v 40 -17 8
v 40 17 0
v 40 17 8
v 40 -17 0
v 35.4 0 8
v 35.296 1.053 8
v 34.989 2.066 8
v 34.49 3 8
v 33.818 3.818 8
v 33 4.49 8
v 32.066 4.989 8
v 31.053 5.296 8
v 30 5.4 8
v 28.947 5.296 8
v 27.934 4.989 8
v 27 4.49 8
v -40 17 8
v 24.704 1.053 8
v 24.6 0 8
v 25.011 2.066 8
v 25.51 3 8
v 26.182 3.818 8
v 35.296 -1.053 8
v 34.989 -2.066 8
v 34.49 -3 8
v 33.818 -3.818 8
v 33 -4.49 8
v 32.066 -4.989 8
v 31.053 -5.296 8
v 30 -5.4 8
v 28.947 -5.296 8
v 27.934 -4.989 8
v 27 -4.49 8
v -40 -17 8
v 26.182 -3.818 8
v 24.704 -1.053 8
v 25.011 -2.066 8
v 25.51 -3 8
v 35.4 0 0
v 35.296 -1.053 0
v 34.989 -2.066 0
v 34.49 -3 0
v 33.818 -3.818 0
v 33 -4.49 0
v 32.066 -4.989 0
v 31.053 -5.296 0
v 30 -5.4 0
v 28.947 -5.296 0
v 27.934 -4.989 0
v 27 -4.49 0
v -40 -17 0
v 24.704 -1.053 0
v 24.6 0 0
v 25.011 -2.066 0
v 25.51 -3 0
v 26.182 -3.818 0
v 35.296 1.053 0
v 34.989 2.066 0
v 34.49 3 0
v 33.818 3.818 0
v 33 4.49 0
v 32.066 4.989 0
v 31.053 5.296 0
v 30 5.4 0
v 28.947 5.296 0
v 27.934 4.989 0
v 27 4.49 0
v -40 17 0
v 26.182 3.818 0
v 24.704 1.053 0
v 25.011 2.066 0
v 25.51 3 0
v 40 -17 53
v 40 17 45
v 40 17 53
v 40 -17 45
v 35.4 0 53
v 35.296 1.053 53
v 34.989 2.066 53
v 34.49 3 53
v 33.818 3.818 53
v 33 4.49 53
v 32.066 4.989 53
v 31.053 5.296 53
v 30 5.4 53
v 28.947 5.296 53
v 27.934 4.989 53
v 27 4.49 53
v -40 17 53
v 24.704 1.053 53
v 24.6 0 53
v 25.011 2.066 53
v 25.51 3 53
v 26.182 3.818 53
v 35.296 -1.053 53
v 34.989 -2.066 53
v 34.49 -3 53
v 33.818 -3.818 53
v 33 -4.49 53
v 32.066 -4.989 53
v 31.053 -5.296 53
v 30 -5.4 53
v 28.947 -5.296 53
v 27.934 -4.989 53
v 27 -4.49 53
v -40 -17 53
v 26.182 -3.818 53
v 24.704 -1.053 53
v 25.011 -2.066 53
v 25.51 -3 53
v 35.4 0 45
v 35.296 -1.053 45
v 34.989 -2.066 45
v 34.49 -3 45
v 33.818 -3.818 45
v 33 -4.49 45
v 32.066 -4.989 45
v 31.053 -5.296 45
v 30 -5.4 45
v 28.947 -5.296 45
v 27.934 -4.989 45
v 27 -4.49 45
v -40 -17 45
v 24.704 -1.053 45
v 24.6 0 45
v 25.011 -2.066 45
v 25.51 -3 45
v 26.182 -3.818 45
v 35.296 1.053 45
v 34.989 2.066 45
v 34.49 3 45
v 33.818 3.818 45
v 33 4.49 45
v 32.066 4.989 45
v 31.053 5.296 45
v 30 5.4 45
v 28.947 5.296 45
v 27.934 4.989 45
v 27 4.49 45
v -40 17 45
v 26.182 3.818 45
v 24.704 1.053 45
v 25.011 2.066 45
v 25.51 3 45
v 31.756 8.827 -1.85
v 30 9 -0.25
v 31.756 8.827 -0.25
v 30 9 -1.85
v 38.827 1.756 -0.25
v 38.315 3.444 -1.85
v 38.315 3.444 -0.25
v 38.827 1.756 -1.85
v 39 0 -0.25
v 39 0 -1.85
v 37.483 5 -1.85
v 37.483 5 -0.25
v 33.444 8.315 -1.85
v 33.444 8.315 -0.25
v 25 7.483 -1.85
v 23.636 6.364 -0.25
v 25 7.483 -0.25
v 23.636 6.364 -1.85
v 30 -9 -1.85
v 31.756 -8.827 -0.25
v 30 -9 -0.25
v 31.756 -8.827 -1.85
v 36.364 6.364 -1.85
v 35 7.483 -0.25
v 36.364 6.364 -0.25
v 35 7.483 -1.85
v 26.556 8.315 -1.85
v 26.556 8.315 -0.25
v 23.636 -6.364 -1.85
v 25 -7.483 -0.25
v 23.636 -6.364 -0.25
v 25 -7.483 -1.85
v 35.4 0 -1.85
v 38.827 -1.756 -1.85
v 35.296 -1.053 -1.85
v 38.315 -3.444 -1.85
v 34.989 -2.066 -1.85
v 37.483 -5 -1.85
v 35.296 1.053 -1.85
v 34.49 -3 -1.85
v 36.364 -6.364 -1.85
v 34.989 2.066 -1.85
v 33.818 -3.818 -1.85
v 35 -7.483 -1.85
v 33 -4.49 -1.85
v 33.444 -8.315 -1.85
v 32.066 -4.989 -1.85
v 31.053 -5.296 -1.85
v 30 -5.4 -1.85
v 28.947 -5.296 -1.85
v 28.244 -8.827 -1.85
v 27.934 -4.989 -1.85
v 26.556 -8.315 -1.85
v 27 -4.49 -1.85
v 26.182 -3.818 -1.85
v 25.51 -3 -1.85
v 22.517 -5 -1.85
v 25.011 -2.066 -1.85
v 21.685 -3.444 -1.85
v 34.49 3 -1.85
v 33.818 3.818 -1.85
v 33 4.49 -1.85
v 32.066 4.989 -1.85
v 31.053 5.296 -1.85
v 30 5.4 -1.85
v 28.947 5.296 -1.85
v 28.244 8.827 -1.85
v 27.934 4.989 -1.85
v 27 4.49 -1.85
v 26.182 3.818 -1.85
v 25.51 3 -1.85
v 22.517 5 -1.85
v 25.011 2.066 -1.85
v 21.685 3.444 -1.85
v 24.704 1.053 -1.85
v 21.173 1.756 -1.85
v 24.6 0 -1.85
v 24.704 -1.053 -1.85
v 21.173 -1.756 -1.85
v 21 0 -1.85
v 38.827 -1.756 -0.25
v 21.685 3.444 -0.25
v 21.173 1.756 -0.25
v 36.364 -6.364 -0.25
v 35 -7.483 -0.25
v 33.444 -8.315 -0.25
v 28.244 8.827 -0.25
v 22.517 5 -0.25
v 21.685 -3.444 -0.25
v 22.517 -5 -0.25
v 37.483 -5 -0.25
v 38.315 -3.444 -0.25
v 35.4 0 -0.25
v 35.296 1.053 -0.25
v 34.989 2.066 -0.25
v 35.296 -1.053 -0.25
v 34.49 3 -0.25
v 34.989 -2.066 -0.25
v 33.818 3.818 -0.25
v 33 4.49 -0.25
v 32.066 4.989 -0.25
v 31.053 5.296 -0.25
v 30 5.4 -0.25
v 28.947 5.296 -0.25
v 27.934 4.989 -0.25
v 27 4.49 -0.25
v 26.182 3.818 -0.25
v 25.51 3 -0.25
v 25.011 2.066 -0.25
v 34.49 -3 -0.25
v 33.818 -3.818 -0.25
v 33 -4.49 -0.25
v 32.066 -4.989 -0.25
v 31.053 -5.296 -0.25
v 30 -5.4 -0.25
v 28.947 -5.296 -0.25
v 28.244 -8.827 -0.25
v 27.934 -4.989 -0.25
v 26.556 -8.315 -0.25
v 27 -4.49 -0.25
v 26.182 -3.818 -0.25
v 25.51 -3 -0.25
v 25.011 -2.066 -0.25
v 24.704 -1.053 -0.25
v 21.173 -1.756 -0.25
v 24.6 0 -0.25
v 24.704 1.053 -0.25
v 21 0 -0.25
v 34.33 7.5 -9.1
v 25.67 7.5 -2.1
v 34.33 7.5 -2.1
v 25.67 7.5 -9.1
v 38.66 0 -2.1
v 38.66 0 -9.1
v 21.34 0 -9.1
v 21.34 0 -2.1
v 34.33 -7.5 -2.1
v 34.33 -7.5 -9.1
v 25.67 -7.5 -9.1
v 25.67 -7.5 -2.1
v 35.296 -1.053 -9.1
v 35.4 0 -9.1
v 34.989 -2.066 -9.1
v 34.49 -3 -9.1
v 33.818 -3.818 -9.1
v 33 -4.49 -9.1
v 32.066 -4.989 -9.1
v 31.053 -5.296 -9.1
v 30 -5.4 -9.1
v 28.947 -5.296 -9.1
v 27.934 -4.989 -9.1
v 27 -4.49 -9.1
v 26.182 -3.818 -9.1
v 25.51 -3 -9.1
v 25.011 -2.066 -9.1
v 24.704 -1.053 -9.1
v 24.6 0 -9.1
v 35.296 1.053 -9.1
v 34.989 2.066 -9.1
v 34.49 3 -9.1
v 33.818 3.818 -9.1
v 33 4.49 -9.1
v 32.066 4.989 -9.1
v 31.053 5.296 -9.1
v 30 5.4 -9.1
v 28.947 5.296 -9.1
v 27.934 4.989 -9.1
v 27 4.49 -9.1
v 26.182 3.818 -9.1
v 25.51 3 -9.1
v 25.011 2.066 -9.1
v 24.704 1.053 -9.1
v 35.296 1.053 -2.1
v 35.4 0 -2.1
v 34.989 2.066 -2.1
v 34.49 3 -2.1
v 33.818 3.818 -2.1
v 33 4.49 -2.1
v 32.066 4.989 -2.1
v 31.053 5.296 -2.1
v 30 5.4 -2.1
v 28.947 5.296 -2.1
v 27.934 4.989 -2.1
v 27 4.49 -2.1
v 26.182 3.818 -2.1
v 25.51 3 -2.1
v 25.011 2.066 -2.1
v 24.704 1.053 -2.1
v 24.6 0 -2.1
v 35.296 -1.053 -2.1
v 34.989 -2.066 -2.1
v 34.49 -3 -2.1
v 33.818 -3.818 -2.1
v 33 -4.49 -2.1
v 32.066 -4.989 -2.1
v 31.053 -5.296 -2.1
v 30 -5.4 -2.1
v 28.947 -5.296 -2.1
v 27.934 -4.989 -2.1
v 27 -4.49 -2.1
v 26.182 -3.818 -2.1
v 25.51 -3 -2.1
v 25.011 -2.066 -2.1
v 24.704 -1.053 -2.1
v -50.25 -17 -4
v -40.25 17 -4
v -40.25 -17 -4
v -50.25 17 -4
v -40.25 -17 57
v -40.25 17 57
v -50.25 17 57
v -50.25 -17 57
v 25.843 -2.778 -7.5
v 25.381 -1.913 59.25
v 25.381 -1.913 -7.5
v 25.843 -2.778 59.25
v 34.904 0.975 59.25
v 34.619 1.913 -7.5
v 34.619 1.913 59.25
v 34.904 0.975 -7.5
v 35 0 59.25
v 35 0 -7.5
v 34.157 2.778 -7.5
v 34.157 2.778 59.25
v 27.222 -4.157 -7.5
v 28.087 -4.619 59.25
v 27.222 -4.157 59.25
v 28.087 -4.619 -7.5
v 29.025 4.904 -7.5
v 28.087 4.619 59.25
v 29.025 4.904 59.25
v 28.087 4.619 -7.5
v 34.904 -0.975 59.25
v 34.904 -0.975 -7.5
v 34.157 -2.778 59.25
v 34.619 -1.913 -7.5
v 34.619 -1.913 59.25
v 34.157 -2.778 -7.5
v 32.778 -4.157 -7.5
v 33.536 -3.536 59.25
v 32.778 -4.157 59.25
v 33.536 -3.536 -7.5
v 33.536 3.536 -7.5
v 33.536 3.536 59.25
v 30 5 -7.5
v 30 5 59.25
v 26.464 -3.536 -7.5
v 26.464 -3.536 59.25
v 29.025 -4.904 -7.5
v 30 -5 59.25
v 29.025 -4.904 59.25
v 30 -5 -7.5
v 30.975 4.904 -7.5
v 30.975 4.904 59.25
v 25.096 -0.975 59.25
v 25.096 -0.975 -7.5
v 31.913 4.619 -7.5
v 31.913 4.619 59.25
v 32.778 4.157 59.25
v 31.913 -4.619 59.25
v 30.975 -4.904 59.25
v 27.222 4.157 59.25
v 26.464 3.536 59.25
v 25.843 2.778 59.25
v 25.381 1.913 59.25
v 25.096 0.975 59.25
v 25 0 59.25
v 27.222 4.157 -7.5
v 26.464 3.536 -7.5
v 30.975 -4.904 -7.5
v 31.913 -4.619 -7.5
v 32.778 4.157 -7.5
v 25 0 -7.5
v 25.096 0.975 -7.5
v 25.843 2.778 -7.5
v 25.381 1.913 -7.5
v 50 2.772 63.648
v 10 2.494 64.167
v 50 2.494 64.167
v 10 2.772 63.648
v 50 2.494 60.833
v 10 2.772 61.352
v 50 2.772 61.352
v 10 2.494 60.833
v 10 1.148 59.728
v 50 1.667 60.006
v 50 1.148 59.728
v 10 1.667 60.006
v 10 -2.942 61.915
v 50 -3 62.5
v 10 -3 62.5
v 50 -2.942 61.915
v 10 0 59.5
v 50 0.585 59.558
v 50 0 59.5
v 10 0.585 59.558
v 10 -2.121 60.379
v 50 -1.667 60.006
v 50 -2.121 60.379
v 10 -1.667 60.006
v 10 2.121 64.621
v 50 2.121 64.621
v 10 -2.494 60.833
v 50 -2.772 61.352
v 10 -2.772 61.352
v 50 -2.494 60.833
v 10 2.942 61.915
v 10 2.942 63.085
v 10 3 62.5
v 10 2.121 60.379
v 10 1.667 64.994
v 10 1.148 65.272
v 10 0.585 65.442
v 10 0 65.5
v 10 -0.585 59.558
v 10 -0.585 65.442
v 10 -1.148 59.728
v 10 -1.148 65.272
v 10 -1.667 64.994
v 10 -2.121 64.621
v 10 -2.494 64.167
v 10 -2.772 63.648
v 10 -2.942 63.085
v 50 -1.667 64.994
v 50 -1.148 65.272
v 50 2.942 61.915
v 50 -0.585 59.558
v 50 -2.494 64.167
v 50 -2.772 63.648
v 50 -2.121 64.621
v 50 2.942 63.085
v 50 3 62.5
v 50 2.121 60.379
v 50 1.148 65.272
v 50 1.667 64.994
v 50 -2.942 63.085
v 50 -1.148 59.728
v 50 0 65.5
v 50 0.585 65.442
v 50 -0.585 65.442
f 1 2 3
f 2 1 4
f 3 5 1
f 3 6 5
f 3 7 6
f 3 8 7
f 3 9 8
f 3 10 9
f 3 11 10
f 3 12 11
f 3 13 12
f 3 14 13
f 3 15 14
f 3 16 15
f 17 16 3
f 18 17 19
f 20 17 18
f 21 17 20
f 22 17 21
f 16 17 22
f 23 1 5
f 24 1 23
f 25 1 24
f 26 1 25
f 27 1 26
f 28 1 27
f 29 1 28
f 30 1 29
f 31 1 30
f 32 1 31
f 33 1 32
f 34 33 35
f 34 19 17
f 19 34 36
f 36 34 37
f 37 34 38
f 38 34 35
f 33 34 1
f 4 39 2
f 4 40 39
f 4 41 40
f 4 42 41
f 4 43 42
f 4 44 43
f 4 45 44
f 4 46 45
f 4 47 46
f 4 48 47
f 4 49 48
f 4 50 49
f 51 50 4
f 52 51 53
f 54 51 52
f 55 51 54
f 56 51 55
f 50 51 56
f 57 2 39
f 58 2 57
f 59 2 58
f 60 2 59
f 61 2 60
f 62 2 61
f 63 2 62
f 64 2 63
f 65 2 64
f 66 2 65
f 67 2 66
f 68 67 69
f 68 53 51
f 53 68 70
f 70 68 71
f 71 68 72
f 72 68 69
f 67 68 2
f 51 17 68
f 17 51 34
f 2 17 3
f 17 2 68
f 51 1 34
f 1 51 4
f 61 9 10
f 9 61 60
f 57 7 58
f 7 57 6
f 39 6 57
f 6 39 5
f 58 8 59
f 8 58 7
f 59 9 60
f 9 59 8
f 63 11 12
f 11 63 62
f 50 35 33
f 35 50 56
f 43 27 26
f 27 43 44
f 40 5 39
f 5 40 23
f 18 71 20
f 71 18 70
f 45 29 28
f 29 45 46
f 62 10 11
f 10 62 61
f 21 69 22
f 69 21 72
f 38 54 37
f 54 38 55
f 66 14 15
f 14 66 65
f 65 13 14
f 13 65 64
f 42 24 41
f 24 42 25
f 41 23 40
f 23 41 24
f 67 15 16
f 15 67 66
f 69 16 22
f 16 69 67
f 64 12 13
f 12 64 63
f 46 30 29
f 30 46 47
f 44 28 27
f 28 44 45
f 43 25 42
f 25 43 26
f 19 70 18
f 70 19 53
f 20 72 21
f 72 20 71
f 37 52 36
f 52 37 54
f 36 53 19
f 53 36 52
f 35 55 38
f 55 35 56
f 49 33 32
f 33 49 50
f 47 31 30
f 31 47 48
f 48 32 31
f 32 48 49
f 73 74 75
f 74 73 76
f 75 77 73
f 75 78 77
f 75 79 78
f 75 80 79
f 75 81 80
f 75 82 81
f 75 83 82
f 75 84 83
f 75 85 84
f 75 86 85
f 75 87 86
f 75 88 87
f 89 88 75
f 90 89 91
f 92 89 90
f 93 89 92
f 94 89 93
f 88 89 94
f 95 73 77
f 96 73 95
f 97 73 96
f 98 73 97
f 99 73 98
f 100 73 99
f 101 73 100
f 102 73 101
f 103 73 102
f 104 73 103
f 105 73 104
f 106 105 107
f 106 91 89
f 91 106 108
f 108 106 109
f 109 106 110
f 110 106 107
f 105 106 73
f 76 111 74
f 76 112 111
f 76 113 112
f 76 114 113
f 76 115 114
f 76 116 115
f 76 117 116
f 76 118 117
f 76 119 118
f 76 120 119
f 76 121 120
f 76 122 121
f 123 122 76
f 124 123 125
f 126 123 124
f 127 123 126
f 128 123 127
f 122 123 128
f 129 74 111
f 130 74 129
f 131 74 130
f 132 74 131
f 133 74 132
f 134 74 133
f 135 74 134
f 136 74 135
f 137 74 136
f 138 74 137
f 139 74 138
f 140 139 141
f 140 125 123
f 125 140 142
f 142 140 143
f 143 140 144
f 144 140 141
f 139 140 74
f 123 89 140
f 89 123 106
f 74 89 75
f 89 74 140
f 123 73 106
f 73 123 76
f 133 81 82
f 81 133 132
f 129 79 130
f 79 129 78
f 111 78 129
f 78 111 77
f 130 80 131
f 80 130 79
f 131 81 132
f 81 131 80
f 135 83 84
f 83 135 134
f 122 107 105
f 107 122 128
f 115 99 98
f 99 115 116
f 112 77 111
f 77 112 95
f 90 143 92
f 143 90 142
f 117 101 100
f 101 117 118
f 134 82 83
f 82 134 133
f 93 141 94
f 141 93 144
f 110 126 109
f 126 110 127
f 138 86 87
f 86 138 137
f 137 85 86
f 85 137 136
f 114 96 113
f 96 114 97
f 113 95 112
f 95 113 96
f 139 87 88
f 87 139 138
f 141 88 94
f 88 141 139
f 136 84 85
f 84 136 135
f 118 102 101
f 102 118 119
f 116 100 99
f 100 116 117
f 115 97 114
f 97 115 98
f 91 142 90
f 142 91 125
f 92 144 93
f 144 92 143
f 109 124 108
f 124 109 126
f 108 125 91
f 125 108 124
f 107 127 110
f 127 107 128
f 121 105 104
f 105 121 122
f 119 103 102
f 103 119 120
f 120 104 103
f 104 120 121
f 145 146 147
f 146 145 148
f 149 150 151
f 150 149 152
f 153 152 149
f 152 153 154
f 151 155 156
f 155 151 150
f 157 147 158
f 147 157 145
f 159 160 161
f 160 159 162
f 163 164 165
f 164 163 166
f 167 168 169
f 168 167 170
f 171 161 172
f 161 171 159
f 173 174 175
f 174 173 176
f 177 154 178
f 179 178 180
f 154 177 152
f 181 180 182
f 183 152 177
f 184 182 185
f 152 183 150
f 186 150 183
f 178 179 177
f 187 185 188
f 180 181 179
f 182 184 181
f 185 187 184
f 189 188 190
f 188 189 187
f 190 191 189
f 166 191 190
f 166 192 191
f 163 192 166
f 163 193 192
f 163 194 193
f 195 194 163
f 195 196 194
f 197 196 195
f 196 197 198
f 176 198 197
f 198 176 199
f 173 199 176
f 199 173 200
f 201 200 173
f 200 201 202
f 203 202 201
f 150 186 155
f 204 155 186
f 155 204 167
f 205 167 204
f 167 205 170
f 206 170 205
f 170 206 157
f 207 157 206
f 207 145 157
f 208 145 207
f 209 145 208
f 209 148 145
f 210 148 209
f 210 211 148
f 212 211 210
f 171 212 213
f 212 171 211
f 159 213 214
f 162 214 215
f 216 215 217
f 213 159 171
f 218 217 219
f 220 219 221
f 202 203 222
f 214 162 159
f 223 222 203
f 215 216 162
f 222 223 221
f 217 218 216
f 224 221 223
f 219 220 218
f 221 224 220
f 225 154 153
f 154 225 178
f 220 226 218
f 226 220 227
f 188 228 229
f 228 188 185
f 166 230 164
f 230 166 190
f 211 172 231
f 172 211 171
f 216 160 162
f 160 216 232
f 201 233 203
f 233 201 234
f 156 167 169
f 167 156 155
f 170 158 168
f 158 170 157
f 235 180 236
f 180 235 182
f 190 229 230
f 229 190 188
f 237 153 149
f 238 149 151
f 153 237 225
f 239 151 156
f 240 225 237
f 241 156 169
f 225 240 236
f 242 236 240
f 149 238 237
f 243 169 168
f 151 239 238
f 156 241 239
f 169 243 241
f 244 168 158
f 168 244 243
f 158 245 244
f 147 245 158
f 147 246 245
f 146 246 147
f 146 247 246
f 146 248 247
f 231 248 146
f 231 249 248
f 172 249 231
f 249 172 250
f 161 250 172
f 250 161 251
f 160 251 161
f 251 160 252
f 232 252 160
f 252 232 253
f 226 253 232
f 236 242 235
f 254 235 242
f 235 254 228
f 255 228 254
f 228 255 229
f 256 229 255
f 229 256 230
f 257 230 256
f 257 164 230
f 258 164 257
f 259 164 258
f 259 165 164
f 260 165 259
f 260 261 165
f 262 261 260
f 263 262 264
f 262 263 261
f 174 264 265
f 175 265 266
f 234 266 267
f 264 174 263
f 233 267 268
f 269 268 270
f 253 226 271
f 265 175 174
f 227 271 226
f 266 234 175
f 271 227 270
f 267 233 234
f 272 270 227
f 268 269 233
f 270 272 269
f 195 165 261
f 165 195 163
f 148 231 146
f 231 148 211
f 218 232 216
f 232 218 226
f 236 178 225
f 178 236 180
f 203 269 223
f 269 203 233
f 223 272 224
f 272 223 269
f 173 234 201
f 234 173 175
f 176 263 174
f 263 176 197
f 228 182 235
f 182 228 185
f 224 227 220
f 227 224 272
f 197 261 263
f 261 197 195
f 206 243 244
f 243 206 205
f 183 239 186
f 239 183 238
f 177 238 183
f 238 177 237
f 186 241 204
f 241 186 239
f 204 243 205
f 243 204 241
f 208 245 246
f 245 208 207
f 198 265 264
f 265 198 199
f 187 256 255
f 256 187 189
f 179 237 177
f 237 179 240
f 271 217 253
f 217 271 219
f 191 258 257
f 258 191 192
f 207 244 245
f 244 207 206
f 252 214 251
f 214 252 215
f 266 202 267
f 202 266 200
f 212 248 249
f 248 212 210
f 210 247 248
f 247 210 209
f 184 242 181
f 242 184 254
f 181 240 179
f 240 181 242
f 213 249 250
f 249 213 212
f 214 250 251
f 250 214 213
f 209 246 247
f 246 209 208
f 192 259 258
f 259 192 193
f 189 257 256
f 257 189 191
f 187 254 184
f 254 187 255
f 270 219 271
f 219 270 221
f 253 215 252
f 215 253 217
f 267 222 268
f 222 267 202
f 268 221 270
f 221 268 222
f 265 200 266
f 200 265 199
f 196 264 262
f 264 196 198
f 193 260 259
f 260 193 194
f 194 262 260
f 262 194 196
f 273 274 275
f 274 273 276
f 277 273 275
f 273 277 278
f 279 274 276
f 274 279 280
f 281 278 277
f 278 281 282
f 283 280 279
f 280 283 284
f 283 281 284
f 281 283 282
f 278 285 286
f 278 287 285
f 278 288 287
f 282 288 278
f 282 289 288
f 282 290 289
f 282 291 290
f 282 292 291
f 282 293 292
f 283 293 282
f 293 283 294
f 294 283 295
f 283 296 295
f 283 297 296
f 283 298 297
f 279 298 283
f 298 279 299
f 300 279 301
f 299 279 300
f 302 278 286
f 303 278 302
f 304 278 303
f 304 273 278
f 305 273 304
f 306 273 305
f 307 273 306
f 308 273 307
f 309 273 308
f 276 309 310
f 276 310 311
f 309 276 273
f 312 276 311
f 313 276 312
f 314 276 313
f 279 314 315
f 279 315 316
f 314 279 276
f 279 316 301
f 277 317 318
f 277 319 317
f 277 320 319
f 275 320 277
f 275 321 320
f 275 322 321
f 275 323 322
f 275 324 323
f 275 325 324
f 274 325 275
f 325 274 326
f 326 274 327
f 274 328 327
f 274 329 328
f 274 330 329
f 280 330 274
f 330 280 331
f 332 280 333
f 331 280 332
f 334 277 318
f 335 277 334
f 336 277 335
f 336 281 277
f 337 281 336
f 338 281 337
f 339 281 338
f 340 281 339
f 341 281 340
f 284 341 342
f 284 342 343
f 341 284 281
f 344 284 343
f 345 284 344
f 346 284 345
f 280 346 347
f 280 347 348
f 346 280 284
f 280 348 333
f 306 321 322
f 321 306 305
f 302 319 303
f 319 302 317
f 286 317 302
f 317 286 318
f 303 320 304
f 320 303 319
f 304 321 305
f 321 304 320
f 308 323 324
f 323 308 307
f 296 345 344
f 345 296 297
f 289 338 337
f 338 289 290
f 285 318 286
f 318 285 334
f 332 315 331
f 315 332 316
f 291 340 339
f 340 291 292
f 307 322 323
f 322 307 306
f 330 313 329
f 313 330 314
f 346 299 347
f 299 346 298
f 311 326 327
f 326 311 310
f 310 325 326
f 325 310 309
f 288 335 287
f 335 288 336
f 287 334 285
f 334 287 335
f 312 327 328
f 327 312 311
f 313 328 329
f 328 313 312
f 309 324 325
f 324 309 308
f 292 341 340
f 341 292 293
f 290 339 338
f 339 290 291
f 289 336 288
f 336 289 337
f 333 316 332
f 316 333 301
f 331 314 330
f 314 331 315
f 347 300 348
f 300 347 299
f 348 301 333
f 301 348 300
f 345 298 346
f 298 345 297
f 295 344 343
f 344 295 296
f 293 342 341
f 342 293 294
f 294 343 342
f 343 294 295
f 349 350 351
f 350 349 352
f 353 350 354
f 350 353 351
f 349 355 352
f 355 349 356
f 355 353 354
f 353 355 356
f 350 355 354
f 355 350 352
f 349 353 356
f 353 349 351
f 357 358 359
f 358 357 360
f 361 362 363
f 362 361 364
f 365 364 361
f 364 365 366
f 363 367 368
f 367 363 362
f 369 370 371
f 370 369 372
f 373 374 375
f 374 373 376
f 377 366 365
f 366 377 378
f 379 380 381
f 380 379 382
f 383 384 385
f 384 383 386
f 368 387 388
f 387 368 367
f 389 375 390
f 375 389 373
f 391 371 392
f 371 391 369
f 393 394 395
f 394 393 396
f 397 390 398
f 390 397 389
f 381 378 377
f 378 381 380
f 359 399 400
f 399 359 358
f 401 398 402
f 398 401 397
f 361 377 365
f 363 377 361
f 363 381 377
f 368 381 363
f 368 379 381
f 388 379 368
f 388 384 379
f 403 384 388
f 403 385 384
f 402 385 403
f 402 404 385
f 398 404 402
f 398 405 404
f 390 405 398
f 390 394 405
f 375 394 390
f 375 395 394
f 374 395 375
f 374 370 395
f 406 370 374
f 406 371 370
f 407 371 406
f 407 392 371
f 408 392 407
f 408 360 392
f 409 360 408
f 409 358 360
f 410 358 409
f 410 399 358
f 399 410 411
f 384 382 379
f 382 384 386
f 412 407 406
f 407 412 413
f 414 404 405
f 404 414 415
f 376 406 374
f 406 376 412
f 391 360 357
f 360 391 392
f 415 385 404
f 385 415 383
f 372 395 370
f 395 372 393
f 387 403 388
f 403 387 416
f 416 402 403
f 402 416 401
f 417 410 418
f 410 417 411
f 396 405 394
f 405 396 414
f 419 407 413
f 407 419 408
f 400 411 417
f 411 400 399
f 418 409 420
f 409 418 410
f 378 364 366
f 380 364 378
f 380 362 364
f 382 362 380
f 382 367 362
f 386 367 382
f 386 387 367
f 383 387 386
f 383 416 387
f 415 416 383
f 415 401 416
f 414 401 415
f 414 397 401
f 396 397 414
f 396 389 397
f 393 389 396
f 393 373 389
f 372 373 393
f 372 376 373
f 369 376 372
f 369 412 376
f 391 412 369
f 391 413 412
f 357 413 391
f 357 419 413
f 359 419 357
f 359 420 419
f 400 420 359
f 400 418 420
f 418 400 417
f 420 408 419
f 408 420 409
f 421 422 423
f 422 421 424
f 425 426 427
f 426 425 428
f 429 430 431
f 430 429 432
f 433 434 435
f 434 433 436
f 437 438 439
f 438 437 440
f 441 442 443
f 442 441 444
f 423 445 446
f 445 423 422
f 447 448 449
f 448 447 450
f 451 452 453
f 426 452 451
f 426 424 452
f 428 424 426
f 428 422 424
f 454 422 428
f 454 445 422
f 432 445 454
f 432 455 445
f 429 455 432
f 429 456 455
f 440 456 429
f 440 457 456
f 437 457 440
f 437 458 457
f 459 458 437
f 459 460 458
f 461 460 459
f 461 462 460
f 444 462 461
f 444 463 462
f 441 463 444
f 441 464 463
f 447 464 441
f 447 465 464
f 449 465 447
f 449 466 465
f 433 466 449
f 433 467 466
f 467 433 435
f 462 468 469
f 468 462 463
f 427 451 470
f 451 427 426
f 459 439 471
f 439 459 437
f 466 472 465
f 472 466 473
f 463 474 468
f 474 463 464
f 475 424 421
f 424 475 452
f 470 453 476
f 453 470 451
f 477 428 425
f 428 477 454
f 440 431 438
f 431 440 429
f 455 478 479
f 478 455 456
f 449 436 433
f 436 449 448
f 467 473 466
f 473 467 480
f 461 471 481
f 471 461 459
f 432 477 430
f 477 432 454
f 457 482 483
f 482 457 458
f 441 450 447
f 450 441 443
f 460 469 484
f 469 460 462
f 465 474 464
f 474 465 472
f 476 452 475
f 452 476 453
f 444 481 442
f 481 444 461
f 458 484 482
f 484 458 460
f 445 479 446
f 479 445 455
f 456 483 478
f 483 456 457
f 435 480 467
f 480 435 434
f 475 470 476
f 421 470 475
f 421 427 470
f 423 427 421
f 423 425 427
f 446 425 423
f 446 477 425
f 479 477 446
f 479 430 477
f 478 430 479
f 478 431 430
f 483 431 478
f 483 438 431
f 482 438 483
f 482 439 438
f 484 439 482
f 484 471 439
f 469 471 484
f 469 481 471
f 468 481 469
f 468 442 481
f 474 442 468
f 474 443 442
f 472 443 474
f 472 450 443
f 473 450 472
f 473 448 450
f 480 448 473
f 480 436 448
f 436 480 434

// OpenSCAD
$fn = 32;

// ------------------------------------------------------------------------
// C clamp: throat 45 mm, screw d10
// Every part is its own module, assembly() places every instance.
// ------------------------------------------------------------------------

// --- part 1 ---
module clamp_arm() {
  difference() {
    translate([-40, -17, 0]) cube([80, 34, 8]);
    translate([30, 0, -1]) cylinder(h = 10, d = 10.8);
  }
}

// --- part 2 ---
module clamp_spine() {
  difference() {
    translate([-30.5, -17, 0]) cube([61, 34, 10]);
  }
}

// --- part 3 ---
module clamp_screw() {
  translate([0, 0, -33.375]) cylinder(h = 66.75, d = 10);
}

// --- part 4 ---
module clamp_washer() {
  difference() {
      translate([0, 0, 0]) cylinder(h = 1.6, d = 18);
      translate([0, 0, -1]) cylinder(h = 3.6, d = 10.8);
    }
}

// --- part 5 ---
module clamp_nut() {
  difference() {
    linear_extrude(height = 7) polygon(points = [[8.66, 0], [4.33, 7.5], [-4.33, 7.5], [-8.66, 0], [-4.33, -7.5], [4.33, -7.5]]);
    translate([0, 0, -1]) cylinder(h = 9, d = 10.8);
  }
}

// --- part 6 ---
module tommy_bar() {
  translate([0, 0, -20]) cylinder(h = 40, d = 6);
}

// --- assembly ---
module assembly() {
  color([0.80, 0.24, 0.20]) translate([0, 0, 0]) rotate([0, 0, 0]) clamp_arm();
  color([0.20, 0.45, 0.75]) translate([0, 0, 45]) rotate([0, 0, 0]) clamp_arm();
  color([0.25, 0.62, 0.32]) translate([-50.25, 0, 26.5]) rotate([0, 90, 0]) clamp_spine();
  color([0.92, 0.70, 0.18]) translate([30, 0, 25.875]) rotate([0, 0, 0]) clamp_screw();
  color([0.58, 0.35, 0.70]) translate([30, 0, -1.85]) rotate([0, 0, 0]) clamp_washer();
  color([0.16, 0.66, 0.66]) translate([30, 0, -9.1]) rotate([0, 0, 0]) clamp_nut();
  color([0.85, 0.48, 0.18]) translate([30, 0, 62.5]) rotate([0, 90, 0]) tommy_bar();
}

assembly();
